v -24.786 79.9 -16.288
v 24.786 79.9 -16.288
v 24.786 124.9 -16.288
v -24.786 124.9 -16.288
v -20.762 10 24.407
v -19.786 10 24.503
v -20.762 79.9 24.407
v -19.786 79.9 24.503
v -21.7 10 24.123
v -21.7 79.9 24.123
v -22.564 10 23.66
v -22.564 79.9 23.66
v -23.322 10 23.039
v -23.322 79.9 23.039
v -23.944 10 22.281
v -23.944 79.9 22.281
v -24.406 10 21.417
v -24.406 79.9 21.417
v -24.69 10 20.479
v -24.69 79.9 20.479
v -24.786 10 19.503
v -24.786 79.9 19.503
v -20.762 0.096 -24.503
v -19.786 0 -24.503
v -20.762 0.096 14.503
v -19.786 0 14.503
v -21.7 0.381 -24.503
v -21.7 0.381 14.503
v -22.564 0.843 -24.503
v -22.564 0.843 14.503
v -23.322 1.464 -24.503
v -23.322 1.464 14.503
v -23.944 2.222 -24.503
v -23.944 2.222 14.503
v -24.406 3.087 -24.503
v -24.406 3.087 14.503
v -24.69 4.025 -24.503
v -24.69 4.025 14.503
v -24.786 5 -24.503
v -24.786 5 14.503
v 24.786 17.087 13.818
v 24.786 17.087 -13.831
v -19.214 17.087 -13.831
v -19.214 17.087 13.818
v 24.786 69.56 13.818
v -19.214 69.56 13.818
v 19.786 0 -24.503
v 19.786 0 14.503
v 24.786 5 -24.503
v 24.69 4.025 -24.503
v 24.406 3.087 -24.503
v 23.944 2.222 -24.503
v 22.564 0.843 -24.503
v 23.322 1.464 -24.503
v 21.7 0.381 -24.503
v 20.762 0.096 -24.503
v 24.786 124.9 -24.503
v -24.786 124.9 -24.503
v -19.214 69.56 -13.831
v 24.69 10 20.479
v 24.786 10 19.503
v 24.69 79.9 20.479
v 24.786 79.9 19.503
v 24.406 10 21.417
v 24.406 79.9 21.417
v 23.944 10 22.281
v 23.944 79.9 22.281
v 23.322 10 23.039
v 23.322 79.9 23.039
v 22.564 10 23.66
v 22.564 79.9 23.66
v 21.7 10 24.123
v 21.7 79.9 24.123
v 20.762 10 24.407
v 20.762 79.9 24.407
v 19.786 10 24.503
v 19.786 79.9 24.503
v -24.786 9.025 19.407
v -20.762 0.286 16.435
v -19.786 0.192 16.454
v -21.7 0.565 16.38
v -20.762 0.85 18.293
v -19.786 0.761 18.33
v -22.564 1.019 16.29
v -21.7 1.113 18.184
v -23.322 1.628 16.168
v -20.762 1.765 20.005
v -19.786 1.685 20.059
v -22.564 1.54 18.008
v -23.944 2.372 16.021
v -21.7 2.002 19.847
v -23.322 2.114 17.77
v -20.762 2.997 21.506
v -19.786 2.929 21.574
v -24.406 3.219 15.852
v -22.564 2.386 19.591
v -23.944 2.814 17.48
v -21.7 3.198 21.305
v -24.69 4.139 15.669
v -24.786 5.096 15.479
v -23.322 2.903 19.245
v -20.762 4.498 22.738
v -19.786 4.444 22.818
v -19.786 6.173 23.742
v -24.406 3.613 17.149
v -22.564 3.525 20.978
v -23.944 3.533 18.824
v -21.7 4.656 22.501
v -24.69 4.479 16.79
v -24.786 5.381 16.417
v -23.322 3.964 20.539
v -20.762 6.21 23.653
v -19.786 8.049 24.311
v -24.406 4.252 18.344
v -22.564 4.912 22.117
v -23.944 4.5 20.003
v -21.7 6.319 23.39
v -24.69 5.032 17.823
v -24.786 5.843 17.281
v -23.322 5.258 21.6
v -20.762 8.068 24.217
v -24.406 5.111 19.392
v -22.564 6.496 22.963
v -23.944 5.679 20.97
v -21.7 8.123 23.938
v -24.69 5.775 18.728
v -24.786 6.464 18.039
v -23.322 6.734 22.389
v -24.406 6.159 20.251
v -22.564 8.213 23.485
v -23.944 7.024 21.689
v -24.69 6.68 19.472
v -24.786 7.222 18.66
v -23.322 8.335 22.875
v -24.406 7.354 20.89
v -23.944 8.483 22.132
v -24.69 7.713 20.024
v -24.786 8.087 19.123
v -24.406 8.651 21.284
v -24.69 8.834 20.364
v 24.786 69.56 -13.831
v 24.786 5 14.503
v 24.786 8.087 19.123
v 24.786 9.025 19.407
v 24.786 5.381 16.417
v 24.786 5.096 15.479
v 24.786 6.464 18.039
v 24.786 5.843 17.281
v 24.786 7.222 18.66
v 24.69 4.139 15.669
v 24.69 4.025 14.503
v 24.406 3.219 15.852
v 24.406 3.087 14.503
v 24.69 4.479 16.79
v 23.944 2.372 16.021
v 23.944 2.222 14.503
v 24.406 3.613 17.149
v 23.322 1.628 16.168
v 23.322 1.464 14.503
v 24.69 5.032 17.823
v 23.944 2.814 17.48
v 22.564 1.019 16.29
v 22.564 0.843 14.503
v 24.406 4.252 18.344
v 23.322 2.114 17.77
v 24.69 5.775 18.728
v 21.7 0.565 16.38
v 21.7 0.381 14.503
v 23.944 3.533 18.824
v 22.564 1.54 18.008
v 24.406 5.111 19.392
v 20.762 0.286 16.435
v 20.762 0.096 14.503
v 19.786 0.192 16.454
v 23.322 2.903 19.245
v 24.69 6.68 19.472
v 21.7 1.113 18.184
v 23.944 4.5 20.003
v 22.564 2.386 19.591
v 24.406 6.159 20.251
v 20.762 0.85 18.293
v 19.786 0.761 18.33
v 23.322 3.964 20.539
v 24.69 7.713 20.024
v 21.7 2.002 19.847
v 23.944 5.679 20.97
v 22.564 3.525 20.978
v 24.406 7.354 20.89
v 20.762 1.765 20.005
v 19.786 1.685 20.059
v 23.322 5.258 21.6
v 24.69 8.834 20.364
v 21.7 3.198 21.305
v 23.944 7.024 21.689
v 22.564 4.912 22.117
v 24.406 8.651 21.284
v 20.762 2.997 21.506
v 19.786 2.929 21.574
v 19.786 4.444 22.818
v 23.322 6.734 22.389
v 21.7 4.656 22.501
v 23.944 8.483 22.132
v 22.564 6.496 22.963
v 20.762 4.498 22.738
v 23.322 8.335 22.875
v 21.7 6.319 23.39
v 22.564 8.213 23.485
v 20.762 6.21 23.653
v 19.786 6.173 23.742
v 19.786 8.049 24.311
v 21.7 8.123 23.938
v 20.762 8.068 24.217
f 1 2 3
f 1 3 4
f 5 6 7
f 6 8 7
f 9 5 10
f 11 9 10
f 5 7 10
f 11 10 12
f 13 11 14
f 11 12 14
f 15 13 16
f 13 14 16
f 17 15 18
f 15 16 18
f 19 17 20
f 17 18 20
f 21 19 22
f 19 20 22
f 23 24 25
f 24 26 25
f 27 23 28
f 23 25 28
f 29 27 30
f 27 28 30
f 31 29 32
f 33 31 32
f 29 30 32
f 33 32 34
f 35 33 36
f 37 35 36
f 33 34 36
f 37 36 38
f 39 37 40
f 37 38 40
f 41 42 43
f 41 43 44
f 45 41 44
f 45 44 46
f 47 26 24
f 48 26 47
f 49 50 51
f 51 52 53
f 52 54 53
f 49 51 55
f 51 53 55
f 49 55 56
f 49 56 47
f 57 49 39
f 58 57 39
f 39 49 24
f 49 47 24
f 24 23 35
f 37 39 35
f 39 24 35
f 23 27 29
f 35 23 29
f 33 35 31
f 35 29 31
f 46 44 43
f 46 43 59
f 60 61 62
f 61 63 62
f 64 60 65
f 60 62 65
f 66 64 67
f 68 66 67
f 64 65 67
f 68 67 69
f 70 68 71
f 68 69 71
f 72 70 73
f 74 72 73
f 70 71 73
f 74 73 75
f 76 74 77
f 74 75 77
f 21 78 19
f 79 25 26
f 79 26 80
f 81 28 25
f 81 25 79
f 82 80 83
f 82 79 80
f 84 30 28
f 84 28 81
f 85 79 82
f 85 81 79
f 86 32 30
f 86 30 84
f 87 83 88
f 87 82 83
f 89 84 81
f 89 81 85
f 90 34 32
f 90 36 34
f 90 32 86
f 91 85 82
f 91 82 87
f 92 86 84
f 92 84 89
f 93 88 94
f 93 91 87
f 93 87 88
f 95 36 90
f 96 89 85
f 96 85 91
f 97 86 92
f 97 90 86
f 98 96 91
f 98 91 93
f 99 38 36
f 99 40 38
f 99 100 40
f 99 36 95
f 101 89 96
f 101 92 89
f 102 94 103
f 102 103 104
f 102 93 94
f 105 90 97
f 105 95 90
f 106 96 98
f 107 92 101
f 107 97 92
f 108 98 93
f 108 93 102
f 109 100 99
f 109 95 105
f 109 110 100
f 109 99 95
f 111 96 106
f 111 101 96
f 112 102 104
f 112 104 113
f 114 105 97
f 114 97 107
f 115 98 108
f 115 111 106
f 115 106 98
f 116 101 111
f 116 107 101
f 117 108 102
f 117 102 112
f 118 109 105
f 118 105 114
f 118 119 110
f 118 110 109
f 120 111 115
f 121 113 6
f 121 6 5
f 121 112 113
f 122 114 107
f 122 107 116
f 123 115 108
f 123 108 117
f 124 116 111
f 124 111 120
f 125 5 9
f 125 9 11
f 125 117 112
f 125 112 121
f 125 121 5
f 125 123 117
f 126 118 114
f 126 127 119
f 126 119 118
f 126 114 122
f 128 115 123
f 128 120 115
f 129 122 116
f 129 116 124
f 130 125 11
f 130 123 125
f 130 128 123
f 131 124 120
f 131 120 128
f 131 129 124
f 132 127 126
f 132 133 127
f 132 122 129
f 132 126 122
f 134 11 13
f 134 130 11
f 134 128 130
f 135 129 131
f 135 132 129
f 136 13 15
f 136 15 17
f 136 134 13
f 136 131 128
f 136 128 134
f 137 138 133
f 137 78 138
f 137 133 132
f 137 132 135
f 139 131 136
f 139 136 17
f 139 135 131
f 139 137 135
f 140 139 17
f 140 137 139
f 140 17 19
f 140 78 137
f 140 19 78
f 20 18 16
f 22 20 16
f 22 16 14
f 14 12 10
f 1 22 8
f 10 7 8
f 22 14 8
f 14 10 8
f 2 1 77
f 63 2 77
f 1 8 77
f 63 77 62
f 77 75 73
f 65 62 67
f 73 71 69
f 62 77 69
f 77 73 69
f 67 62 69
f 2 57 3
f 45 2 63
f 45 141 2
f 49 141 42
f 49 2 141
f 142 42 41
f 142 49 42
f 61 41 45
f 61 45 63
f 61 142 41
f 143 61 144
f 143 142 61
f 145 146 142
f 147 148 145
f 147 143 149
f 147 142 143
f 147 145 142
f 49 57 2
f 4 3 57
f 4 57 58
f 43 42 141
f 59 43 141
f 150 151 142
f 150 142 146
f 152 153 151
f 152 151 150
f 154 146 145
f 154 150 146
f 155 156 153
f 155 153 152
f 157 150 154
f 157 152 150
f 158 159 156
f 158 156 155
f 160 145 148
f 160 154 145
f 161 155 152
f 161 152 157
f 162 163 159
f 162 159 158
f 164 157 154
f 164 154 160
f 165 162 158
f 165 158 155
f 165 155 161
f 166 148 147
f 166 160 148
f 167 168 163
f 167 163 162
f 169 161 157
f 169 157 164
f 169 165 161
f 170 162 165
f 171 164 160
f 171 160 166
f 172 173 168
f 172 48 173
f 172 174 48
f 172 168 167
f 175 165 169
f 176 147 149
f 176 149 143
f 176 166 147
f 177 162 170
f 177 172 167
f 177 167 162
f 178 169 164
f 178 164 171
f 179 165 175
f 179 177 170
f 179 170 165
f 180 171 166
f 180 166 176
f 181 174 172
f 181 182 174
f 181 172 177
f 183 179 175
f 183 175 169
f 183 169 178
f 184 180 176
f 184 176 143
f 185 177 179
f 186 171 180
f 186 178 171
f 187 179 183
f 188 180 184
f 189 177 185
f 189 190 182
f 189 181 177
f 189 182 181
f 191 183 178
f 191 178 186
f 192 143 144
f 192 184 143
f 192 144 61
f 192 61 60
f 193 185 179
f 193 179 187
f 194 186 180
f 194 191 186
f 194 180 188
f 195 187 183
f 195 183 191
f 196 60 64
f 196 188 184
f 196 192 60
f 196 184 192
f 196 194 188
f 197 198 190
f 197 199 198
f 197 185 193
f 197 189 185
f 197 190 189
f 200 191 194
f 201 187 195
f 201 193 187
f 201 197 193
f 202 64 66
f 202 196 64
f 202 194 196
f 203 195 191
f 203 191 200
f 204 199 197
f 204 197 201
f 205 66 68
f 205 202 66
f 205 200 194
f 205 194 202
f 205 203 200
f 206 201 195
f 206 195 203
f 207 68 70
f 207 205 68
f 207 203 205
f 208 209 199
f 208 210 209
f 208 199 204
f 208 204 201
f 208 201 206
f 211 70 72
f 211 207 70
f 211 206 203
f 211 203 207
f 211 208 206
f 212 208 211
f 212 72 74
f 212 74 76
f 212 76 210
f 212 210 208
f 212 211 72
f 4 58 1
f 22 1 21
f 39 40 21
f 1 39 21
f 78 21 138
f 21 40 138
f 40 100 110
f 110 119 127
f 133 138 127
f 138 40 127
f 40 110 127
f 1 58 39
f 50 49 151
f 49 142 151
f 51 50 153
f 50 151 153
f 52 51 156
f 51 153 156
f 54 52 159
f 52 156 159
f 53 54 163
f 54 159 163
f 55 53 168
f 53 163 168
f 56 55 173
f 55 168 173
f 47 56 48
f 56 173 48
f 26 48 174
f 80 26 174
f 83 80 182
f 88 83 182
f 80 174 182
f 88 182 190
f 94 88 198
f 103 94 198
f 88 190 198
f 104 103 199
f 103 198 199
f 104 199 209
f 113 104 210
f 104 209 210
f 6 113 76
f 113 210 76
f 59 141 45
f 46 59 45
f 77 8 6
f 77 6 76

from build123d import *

# Parameters (mm, degrees)
F0_W     = 49.5728366077
F0_H     = 49.0062981844
F1_DEPTH = 79.9
F2_W     = 49.5728366077
F2_H     = 8.2149282098
F3_DEPTH = 45
F4_R     = 10
F5_R     = 5
F7_W     = 52.4731706828
F7_H     = 27.6486203074
F8_DEPTH = 44


with BuildPart() as f1:
    # F0 (on Front) → F1 (new body)
    with BuildSketch(Plane.XZ):
        Rectangle(F0_W, F0_H)
    extrude(amount=-F1_DEPTH)

    # F2 (on face) → F3 (join)
    with BuildSketch(Plane(origin=(0, 79.9, 0), x_dir=(-1, 0, 0), z_dir=(0, 1, 0))):
        with Locations((0, -20.3956849873)):
            Rectangle(F2_W, F2_H)
    extrude(amount=F3_DEPTH)

    # F4
    f4_edges = [f1.edges().sort_by_distance(p)[0] for p in [
        (0, 0, 24.503149),
    ]]
    fillet(f4_edges, radius=F4_R)

    # F5
    f5_edges = [f1.edges().sort_by_distance(p)[0] for p in [
        (24.786418, 2.928932, 21.574217),
        (-24.786418, 2.928932, 21.574217),
    ]]
    fillet(f5_edges, radius=F5_R)

    # F7 (on face) → F8 (cut)
    with BuildSketch(Plane.YZ.offset(24.7864183038)):
        with Locations((43.3237338439, -0.006724149)):
            Rectangle(F7_W, F7_H)
    extrude(amount=-F8_DEPTH, mode=Mode.SUBTRACT)


solid = f1.part
